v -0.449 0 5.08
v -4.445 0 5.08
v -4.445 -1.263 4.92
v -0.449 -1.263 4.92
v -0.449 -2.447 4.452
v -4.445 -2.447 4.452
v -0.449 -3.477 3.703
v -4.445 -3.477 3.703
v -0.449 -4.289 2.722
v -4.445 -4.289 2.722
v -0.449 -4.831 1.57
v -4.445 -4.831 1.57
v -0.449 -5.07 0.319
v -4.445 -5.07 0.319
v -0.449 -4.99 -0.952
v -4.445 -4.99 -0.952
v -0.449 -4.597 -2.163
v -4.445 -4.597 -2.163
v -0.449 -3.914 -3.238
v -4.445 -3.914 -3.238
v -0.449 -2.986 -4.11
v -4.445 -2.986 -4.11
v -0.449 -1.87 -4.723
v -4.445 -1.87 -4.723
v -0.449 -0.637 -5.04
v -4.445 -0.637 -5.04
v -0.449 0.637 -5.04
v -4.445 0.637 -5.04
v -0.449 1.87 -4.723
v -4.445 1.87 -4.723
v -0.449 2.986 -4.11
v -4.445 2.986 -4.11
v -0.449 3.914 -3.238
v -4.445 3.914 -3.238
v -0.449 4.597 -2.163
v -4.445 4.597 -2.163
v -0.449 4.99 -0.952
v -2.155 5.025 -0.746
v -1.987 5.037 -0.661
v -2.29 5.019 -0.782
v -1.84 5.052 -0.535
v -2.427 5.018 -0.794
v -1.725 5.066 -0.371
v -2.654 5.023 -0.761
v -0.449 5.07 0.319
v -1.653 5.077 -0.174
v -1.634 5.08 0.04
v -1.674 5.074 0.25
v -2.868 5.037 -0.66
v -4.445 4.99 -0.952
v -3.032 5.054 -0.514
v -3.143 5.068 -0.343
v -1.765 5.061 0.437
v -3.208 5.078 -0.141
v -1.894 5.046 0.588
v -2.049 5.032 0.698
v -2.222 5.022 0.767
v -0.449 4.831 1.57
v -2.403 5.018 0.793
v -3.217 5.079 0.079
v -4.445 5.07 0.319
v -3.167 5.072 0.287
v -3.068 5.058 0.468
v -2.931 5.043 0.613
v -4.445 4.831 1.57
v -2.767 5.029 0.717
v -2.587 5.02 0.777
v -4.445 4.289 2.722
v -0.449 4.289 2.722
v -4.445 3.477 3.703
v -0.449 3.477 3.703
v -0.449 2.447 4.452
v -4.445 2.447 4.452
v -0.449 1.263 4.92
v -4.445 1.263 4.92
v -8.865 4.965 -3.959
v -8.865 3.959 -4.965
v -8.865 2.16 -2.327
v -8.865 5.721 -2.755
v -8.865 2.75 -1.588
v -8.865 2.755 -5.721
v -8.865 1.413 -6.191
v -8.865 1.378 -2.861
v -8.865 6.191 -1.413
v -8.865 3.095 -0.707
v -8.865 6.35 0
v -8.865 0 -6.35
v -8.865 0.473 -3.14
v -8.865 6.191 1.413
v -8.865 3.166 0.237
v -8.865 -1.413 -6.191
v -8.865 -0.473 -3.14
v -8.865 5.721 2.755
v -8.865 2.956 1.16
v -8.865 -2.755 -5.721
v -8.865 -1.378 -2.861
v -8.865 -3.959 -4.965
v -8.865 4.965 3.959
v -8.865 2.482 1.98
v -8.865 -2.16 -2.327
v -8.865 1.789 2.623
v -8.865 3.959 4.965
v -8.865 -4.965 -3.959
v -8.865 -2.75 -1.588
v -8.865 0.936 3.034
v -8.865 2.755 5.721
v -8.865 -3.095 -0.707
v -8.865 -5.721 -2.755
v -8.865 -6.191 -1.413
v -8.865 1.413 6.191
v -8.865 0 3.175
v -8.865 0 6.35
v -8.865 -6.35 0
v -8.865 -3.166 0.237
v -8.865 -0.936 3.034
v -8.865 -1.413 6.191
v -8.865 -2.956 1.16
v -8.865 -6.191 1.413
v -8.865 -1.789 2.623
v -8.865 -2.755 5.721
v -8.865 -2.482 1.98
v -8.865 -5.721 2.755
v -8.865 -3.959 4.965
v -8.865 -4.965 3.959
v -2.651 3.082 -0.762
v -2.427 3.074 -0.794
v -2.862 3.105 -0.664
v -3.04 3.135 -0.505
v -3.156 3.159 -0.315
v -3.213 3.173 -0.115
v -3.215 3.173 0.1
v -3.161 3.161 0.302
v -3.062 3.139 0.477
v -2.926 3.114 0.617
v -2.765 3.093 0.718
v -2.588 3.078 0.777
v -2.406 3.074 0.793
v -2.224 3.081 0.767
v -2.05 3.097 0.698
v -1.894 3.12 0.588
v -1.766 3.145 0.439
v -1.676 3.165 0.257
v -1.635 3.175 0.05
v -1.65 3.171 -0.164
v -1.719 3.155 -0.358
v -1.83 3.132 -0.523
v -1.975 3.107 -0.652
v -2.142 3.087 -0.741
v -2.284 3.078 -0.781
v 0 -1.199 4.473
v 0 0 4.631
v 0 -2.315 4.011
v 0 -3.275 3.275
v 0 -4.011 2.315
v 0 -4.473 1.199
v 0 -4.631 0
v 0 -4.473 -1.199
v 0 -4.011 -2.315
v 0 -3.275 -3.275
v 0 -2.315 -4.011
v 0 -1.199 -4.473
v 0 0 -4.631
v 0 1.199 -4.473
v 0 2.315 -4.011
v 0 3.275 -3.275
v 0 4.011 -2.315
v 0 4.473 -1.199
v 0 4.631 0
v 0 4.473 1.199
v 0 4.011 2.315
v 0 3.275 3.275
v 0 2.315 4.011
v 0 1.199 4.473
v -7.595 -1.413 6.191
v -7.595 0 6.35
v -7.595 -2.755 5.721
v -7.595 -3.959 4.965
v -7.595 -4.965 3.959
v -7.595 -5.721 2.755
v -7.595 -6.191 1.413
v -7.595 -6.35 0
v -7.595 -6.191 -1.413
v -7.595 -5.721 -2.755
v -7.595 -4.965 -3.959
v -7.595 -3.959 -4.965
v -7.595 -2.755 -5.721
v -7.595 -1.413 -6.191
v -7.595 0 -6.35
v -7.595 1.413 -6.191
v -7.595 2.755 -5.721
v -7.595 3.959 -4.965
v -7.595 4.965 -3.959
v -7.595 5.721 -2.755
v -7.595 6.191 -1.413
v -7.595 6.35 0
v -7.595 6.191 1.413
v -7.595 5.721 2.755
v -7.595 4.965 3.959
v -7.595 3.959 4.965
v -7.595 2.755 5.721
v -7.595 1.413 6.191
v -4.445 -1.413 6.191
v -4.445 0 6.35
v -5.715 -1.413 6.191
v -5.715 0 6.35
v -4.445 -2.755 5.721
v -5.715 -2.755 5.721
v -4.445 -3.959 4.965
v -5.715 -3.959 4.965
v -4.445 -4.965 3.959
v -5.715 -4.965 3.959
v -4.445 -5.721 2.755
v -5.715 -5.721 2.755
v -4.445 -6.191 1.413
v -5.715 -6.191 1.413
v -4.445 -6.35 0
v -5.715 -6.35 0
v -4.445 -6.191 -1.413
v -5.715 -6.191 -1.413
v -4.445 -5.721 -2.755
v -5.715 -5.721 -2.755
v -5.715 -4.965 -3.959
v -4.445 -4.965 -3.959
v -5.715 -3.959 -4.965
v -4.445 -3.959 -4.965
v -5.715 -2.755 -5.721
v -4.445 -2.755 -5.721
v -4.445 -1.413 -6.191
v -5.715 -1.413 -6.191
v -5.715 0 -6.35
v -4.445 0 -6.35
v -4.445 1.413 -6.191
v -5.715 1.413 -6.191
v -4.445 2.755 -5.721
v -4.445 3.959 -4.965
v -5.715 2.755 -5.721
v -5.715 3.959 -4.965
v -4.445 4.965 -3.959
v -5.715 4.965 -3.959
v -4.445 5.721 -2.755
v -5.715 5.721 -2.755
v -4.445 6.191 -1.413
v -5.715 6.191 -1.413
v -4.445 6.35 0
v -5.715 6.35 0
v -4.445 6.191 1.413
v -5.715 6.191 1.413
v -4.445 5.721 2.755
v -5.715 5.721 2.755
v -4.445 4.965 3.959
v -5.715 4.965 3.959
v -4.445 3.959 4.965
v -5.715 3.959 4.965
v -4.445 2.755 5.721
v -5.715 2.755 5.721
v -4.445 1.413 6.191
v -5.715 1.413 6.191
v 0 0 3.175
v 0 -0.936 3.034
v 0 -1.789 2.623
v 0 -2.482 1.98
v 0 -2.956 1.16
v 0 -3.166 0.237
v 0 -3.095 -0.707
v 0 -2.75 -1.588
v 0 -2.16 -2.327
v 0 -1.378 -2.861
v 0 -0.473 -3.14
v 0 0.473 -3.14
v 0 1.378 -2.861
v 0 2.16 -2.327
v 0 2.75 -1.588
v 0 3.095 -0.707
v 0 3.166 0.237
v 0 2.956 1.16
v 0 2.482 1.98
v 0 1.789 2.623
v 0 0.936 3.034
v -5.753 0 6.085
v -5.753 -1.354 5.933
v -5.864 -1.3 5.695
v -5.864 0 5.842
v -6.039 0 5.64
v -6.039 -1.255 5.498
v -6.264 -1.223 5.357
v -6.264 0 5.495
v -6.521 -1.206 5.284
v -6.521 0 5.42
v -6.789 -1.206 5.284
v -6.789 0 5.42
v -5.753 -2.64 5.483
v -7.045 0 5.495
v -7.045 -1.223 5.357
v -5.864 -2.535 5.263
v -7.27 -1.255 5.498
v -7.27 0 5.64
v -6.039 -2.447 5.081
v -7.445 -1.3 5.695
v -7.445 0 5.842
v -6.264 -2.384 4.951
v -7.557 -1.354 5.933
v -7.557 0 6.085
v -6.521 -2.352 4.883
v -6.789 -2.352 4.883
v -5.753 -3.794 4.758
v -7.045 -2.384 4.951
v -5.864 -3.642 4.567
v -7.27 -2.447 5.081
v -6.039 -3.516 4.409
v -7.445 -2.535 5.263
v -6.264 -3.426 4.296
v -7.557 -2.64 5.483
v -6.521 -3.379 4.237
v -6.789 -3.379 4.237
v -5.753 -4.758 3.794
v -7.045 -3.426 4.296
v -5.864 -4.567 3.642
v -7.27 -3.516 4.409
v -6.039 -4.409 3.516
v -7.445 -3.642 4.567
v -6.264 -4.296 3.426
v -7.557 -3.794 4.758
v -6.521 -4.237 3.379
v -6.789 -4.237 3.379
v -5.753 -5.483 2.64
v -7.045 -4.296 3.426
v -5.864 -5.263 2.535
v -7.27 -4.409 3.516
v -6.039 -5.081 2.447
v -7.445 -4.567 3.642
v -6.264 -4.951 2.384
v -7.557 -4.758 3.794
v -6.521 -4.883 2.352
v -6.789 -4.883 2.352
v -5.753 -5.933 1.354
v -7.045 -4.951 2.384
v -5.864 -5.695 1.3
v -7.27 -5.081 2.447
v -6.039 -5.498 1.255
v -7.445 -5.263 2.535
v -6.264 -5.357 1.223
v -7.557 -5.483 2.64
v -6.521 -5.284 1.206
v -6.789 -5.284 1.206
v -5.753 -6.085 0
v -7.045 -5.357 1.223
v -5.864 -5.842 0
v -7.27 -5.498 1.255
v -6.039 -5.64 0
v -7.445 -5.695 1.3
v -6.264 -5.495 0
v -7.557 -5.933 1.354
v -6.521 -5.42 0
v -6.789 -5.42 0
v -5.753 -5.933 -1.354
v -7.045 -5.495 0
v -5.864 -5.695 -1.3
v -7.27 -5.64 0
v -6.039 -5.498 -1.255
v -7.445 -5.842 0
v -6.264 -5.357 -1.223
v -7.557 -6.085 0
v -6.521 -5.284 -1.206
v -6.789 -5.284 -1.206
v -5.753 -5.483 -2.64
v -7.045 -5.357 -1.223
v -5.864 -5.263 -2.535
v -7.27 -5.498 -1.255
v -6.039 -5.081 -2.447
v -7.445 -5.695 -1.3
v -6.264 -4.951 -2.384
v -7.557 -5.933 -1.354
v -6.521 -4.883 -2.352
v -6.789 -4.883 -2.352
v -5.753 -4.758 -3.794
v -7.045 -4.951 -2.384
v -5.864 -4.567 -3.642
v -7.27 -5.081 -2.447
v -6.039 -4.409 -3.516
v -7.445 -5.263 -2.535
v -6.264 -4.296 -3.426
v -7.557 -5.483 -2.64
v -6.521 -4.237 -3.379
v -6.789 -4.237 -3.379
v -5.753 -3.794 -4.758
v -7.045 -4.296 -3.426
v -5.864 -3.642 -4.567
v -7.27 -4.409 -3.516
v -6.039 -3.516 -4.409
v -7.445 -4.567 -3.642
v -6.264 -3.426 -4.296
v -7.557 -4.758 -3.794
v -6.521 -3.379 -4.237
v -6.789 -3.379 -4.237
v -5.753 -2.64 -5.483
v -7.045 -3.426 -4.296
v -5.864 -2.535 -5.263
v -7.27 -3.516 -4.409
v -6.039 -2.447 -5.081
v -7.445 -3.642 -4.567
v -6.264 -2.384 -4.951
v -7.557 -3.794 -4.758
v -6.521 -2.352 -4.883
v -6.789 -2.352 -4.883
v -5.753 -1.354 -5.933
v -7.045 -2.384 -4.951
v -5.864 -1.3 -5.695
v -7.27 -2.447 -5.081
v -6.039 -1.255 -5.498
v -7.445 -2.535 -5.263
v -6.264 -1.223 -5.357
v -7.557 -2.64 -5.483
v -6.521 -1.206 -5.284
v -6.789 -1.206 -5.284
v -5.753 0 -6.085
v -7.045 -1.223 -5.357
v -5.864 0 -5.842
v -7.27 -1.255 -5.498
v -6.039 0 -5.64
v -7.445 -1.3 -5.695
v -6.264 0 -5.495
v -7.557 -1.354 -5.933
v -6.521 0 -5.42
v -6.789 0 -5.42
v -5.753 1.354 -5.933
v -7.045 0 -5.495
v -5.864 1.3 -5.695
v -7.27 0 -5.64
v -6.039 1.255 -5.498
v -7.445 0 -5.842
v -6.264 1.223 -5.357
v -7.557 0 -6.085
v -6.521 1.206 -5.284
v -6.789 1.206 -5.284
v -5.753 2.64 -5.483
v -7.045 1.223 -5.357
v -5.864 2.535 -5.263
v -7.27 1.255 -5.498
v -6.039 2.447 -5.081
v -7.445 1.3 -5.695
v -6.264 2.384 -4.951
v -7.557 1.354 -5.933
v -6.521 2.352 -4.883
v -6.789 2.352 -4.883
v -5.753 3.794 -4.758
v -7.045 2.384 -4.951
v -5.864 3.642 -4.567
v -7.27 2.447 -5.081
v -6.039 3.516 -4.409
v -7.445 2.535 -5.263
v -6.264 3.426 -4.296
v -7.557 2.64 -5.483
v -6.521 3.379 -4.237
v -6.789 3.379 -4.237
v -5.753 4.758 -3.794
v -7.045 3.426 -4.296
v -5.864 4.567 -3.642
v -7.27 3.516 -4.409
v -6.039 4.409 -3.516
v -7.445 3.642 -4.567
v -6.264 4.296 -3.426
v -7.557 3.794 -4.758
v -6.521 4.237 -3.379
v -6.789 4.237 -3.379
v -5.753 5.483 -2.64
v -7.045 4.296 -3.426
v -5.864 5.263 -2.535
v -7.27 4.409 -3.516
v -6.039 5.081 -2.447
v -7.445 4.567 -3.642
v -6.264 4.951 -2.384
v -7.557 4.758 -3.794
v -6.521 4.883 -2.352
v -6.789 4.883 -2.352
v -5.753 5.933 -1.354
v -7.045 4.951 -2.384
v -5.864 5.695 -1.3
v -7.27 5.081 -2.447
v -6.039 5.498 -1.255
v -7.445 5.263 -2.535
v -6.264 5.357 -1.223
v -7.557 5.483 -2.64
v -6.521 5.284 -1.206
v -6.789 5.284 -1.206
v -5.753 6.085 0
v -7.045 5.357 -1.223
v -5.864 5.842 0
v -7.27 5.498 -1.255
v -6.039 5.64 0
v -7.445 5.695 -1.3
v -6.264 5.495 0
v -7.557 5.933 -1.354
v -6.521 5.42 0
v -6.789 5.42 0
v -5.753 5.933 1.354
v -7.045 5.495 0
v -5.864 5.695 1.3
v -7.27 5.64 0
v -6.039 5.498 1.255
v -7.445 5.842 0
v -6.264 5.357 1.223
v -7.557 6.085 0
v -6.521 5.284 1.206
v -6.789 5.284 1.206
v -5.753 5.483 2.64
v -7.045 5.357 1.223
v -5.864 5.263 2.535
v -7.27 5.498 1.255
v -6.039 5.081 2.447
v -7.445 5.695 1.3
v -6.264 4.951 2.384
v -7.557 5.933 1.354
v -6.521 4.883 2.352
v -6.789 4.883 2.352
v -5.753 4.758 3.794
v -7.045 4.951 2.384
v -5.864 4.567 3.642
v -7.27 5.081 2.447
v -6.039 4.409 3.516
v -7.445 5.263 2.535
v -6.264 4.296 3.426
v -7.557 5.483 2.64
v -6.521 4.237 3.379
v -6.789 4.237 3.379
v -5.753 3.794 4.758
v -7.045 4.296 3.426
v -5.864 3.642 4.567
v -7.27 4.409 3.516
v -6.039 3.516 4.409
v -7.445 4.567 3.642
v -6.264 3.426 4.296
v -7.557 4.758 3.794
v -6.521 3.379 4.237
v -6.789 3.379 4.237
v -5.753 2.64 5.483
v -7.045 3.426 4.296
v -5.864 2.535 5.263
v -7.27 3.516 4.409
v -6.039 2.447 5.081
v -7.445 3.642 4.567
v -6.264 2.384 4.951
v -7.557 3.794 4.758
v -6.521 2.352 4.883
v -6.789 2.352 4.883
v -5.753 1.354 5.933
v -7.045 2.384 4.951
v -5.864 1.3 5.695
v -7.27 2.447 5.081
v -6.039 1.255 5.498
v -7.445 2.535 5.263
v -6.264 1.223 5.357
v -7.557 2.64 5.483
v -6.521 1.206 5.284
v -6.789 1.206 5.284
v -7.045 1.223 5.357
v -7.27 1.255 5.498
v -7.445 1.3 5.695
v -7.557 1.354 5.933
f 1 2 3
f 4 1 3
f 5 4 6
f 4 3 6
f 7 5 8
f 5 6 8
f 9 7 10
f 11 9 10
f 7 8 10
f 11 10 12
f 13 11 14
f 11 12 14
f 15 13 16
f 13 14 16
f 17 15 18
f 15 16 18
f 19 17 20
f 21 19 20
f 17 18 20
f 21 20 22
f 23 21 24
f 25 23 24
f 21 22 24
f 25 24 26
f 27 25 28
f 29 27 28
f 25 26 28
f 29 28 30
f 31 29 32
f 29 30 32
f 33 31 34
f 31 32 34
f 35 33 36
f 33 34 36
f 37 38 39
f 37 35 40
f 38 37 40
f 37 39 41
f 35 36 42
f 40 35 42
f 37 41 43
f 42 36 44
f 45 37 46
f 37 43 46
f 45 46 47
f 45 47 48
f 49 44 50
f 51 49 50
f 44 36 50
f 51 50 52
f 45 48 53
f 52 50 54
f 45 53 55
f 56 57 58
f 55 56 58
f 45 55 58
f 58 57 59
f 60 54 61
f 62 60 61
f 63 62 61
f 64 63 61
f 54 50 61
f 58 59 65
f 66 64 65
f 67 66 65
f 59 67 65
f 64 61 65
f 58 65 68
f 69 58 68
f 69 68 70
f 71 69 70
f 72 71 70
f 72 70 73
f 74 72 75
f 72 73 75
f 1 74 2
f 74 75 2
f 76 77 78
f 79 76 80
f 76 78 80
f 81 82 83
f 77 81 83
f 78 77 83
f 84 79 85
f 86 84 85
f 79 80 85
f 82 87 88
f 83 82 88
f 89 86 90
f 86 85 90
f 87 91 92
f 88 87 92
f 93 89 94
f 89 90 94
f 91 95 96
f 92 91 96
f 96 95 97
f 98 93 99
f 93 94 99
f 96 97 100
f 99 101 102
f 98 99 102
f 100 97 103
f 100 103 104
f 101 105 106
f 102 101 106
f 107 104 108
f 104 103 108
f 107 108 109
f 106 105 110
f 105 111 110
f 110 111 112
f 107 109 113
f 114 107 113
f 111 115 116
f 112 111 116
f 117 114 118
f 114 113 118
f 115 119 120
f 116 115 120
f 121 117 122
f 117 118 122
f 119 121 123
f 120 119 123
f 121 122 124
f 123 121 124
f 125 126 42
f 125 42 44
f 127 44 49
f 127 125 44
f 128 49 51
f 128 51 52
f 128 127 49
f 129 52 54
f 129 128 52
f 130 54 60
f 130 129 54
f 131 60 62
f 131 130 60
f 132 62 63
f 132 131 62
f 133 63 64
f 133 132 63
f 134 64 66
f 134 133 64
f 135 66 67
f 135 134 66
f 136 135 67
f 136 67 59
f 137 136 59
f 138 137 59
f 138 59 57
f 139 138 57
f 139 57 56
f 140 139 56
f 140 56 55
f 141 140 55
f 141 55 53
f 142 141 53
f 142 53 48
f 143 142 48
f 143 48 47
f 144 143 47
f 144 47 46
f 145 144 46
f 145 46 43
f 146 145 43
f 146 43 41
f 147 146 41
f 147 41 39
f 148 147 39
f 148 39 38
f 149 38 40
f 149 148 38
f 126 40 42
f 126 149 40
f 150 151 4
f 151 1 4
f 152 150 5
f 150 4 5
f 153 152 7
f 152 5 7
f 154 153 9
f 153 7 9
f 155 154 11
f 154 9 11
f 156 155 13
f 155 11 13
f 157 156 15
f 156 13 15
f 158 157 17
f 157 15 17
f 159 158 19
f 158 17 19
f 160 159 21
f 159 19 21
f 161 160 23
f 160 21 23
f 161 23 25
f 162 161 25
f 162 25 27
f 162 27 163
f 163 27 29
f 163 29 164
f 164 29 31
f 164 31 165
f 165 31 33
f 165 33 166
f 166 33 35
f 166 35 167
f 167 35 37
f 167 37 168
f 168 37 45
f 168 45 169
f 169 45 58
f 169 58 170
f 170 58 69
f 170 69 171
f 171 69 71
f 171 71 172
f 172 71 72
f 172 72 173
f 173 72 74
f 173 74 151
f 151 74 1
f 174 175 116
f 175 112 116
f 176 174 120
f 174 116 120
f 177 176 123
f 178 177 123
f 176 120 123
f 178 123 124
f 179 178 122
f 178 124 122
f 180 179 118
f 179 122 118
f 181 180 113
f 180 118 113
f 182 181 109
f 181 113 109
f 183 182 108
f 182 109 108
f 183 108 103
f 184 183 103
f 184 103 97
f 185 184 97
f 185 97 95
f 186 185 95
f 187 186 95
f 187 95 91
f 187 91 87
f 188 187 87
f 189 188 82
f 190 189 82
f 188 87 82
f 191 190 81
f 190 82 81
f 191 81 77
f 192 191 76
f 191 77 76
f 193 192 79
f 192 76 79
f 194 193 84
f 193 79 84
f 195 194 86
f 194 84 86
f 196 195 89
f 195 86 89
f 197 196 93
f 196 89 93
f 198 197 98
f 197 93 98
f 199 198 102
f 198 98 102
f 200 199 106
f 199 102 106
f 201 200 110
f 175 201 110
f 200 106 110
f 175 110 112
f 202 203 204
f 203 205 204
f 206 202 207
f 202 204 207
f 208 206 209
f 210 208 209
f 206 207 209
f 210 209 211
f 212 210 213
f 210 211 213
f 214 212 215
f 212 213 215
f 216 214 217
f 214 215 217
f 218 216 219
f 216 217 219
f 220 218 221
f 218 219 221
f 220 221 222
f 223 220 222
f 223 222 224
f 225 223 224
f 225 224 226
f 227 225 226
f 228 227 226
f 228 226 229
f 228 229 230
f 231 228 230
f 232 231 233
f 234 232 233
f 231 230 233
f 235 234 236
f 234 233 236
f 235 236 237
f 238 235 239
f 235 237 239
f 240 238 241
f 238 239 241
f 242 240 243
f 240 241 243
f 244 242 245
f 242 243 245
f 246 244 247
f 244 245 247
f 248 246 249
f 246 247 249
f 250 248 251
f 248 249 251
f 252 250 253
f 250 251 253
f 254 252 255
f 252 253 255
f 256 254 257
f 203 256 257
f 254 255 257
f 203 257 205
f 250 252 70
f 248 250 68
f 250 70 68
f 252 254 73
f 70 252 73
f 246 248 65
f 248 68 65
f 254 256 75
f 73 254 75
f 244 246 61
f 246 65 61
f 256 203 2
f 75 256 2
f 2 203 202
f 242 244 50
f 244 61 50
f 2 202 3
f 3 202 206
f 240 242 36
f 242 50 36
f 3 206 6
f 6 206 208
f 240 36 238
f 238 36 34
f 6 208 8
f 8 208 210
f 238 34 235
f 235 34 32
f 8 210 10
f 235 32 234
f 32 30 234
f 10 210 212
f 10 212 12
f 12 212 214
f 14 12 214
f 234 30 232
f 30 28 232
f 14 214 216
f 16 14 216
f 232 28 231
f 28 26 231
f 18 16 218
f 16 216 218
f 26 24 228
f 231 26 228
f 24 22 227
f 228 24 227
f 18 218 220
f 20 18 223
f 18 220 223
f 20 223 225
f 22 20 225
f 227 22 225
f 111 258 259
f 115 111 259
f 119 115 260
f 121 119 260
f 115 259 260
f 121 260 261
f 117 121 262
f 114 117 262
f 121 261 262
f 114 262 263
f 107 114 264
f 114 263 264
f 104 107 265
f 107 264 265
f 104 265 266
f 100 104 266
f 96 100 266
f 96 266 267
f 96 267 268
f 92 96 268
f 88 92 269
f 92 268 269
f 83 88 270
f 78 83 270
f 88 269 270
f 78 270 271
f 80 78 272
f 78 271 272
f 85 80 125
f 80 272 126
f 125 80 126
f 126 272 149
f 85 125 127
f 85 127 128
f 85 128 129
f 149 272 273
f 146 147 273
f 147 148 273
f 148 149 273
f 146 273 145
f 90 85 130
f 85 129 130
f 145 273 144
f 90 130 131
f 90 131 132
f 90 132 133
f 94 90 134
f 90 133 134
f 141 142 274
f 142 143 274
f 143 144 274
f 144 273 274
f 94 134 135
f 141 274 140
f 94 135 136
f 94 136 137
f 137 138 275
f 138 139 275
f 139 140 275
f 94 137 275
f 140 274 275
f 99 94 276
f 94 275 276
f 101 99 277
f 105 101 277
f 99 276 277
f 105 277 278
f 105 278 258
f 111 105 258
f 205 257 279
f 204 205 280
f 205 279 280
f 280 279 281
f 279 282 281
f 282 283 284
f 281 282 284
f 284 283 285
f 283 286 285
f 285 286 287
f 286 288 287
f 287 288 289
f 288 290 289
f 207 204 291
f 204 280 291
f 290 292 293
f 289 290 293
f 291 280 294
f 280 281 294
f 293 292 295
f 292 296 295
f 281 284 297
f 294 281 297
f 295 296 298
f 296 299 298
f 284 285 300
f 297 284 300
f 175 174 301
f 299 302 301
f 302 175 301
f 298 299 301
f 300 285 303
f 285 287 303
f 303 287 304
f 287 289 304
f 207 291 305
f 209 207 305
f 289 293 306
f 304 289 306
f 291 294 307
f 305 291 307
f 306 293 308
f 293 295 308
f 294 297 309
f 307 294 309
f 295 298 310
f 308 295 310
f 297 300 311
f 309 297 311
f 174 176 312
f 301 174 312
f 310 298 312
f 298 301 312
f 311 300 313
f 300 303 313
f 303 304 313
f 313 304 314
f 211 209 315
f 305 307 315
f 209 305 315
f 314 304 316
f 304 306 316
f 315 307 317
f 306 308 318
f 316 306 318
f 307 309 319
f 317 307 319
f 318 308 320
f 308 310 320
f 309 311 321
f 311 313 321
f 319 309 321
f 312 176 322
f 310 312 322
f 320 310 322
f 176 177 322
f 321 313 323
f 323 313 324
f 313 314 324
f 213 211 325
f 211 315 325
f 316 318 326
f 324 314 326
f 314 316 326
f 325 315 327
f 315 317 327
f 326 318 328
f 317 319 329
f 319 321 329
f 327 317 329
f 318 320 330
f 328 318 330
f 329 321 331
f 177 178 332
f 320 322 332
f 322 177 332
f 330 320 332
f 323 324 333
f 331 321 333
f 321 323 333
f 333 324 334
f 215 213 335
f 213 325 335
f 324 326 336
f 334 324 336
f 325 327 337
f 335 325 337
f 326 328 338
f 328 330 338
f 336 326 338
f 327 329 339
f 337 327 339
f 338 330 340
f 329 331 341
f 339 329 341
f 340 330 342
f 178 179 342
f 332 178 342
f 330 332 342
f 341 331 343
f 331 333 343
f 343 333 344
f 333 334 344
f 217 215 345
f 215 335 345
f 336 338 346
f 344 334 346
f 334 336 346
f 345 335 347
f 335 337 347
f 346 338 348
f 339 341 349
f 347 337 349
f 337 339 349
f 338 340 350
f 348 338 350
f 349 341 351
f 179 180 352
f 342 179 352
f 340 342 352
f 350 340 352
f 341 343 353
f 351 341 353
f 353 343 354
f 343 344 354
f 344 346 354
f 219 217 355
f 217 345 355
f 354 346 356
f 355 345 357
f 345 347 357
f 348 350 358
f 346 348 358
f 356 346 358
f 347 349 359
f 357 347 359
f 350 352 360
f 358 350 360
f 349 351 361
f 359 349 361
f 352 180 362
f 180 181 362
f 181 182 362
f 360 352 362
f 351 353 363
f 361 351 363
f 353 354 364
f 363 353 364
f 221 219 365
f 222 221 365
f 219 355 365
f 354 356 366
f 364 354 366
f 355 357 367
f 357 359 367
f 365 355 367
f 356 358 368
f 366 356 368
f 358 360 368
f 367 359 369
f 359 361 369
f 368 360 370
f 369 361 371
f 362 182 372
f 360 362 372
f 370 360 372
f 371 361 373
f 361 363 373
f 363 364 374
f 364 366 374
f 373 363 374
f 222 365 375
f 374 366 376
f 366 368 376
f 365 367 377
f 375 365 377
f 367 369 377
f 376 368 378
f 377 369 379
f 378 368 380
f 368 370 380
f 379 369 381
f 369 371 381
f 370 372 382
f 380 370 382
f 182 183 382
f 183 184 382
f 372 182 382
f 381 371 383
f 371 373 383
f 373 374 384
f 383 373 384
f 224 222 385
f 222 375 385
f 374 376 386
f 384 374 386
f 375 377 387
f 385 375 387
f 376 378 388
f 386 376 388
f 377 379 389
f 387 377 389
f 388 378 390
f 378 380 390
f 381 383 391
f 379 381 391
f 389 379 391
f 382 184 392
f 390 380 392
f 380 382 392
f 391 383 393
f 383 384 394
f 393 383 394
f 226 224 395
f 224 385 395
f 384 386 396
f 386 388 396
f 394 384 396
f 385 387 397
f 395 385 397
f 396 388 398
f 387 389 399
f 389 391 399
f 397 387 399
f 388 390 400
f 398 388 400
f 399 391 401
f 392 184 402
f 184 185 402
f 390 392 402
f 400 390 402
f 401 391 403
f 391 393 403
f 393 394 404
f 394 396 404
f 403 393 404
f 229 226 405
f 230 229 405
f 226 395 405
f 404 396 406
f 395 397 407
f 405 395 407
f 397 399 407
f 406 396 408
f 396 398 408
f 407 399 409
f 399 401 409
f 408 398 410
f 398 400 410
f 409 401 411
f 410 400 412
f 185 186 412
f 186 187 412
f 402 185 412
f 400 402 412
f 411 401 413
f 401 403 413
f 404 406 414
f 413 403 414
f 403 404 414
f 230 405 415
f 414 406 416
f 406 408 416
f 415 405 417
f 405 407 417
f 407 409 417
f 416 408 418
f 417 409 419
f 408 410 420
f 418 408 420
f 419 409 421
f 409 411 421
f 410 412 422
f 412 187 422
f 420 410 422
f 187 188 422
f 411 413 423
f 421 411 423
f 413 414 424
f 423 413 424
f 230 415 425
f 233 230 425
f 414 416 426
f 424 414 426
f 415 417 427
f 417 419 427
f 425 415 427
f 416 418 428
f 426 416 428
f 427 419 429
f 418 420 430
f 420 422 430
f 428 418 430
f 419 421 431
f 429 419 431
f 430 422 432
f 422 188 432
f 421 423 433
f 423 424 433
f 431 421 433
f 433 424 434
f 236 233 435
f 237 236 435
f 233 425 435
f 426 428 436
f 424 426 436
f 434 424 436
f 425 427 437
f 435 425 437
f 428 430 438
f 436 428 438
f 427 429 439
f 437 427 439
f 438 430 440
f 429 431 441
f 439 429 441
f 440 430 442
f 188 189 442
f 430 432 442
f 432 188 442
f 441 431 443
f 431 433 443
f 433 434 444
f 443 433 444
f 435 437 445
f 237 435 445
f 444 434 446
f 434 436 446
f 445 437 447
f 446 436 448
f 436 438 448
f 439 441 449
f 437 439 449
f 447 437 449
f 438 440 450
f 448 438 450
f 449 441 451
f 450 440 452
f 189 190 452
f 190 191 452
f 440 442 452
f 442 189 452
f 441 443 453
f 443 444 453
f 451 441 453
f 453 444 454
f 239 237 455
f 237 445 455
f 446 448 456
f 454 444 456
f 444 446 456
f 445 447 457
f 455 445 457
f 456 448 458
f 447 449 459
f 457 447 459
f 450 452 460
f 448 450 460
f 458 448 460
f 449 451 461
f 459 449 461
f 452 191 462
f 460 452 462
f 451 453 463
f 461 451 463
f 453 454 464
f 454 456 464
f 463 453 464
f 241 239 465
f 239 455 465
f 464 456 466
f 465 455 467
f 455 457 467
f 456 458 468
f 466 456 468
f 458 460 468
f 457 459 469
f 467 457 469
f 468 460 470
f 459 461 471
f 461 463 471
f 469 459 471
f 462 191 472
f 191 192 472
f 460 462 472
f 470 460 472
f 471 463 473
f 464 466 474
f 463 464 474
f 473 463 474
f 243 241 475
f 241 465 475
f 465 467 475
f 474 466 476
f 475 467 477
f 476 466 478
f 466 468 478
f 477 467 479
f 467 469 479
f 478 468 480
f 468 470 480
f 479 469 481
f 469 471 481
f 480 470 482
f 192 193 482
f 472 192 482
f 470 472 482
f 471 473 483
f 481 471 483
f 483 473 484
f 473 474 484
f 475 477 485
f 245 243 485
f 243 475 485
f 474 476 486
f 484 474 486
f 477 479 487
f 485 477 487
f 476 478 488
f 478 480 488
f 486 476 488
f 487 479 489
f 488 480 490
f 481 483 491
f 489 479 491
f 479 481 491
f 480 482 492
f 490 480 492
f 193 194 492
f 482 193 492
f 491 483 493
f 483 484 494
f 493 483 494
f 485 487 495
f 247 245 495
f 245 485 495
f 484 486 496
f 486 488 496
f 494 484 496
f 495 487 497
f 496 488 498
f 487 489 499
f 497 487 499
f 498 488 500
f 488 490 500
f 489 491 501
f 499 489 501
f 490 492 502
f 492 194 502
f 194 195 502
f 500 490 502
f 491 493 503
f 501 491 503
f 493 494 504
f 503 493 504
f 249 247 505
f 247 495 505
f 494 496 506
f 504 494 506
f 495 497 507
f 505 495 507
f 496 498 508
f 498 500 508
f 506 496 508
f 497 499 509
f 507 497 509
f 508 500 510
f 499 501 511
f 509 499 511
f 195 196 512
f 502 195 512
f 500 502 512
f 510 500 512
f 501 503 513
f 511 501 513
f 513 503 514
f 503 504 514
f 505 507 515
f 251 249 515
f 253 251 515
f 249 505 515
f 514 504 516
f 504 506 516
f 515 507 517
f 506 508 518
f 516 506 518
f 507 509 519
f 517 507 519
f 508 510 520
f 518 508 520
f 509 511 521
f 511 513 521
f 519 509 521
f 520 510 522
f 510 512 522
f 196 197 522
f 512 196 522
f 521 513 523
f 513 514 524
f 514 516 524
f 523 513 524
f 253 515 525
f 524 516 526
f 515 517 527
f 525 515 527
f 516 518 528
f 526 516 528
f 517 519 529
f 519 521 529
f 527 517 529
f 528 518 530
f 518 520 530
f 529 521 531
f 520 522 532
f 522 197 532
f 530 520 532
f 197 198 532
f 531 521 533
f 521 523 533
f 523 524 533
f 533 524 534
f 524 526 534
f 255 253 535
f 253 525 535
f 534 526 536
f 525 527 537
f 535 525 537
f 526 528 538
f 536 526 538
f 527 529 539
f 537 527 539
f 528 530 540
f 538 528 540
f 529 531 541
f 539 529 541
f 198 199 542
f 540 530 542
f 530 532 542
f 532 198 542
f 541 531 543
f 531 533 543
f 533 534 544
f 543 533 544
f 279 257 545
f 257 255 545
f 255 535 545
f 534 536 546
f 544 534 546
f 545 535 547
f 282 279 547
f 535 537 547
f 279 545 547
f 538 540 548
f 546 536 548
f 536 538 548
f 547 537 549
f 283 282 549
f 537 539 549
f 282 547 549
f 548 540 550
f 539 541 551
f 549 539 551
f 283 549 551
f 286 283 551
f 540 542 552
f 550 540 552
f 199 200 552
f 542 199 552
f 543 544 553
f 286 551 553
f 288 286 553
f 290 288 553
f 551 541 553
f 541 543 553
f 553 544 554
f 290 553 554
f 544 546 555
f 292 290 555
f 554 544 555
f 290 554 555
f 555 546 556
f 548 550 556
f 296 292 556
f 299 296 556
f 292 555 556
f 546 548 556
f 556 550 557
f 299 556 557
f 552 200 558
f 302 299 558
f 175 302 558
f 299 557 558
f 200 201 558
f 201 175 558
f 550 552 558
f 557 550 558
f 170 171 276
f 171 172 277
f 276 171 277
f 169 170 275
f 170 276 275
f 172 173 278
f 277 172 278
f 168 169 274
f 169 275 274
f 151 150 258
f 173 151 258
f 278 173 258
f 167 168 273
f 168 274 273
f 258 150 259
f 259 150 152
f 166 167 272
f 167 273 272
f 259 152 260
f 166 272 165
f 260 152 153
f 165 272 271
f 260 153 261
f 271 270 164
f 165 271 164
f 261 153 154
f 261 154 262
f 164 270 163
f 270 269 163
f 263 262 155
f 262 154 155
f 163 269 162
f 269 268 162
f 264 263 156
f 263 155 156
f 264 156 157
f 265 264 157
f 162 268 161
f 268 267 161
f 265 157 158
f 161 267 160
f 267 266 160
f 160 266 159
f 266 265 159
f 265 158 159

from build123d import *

# Parameters (mm, degrees)
SKETCH2_R          = 0.79375
CUT_EXTRUDE1_DEPTH = 13.61848379


with BuildPart() as part:
    # Sketch1 → Revolve1 (revolve)
    with BuildSketch(Plane(origin=(0, 0, 0), x_dir=(1, 0, 0), z_dir=(0, 1, 0)), mode=Mode.PRIVATE) as revolve1_sk:
        with BuildLine():
            Line((-8.8646, 3.175), (0, 3.175))
            Line((0, 3.175), (0, 4.630987194))
            Line((0, 4.630987194), (-0.449012806, 5.08))
            Line((-0.449012806, 5.08), (-4.445, 5.08))
            Line((-4.445, 5.08), (-4.445, 6.35))
            Line((-4.445, 6.35), (-5.715, 6.35))
            ThreePointArc((-5.715, 6.35), (-6.6548, 5.4102), (-7.5946, 6.35))
            Line((-7.5946, 6.35), (-8.8646, 6.35))
            Line((-8.8646, 6.35), (-8.8646, 3.175))
        make_face()
    revolve(revolve1_sk.sketch.rotate(Axis((-10.922, 0, 0), (1, 0, 0)), 180), axis=Axis((-10.922, 0, 0), (1, 0, 0)))

    # Sketch2 → Cut-Extrude1 (cut, through all)
    with BuildSketch(Plane(origin=(0, 0, 0), x_dir=(1, 0, 0), z_dir=(0, 1, 0))):
        with Locations(Location((-2.427185556, 0, 0), (0, 0, 90))):
            Circle(SKETCH2_R)
    extrude(amount=CUT_EXTRUDE1_DEPTH, mode=Mode.SUBTRACT)


solid = part.part
